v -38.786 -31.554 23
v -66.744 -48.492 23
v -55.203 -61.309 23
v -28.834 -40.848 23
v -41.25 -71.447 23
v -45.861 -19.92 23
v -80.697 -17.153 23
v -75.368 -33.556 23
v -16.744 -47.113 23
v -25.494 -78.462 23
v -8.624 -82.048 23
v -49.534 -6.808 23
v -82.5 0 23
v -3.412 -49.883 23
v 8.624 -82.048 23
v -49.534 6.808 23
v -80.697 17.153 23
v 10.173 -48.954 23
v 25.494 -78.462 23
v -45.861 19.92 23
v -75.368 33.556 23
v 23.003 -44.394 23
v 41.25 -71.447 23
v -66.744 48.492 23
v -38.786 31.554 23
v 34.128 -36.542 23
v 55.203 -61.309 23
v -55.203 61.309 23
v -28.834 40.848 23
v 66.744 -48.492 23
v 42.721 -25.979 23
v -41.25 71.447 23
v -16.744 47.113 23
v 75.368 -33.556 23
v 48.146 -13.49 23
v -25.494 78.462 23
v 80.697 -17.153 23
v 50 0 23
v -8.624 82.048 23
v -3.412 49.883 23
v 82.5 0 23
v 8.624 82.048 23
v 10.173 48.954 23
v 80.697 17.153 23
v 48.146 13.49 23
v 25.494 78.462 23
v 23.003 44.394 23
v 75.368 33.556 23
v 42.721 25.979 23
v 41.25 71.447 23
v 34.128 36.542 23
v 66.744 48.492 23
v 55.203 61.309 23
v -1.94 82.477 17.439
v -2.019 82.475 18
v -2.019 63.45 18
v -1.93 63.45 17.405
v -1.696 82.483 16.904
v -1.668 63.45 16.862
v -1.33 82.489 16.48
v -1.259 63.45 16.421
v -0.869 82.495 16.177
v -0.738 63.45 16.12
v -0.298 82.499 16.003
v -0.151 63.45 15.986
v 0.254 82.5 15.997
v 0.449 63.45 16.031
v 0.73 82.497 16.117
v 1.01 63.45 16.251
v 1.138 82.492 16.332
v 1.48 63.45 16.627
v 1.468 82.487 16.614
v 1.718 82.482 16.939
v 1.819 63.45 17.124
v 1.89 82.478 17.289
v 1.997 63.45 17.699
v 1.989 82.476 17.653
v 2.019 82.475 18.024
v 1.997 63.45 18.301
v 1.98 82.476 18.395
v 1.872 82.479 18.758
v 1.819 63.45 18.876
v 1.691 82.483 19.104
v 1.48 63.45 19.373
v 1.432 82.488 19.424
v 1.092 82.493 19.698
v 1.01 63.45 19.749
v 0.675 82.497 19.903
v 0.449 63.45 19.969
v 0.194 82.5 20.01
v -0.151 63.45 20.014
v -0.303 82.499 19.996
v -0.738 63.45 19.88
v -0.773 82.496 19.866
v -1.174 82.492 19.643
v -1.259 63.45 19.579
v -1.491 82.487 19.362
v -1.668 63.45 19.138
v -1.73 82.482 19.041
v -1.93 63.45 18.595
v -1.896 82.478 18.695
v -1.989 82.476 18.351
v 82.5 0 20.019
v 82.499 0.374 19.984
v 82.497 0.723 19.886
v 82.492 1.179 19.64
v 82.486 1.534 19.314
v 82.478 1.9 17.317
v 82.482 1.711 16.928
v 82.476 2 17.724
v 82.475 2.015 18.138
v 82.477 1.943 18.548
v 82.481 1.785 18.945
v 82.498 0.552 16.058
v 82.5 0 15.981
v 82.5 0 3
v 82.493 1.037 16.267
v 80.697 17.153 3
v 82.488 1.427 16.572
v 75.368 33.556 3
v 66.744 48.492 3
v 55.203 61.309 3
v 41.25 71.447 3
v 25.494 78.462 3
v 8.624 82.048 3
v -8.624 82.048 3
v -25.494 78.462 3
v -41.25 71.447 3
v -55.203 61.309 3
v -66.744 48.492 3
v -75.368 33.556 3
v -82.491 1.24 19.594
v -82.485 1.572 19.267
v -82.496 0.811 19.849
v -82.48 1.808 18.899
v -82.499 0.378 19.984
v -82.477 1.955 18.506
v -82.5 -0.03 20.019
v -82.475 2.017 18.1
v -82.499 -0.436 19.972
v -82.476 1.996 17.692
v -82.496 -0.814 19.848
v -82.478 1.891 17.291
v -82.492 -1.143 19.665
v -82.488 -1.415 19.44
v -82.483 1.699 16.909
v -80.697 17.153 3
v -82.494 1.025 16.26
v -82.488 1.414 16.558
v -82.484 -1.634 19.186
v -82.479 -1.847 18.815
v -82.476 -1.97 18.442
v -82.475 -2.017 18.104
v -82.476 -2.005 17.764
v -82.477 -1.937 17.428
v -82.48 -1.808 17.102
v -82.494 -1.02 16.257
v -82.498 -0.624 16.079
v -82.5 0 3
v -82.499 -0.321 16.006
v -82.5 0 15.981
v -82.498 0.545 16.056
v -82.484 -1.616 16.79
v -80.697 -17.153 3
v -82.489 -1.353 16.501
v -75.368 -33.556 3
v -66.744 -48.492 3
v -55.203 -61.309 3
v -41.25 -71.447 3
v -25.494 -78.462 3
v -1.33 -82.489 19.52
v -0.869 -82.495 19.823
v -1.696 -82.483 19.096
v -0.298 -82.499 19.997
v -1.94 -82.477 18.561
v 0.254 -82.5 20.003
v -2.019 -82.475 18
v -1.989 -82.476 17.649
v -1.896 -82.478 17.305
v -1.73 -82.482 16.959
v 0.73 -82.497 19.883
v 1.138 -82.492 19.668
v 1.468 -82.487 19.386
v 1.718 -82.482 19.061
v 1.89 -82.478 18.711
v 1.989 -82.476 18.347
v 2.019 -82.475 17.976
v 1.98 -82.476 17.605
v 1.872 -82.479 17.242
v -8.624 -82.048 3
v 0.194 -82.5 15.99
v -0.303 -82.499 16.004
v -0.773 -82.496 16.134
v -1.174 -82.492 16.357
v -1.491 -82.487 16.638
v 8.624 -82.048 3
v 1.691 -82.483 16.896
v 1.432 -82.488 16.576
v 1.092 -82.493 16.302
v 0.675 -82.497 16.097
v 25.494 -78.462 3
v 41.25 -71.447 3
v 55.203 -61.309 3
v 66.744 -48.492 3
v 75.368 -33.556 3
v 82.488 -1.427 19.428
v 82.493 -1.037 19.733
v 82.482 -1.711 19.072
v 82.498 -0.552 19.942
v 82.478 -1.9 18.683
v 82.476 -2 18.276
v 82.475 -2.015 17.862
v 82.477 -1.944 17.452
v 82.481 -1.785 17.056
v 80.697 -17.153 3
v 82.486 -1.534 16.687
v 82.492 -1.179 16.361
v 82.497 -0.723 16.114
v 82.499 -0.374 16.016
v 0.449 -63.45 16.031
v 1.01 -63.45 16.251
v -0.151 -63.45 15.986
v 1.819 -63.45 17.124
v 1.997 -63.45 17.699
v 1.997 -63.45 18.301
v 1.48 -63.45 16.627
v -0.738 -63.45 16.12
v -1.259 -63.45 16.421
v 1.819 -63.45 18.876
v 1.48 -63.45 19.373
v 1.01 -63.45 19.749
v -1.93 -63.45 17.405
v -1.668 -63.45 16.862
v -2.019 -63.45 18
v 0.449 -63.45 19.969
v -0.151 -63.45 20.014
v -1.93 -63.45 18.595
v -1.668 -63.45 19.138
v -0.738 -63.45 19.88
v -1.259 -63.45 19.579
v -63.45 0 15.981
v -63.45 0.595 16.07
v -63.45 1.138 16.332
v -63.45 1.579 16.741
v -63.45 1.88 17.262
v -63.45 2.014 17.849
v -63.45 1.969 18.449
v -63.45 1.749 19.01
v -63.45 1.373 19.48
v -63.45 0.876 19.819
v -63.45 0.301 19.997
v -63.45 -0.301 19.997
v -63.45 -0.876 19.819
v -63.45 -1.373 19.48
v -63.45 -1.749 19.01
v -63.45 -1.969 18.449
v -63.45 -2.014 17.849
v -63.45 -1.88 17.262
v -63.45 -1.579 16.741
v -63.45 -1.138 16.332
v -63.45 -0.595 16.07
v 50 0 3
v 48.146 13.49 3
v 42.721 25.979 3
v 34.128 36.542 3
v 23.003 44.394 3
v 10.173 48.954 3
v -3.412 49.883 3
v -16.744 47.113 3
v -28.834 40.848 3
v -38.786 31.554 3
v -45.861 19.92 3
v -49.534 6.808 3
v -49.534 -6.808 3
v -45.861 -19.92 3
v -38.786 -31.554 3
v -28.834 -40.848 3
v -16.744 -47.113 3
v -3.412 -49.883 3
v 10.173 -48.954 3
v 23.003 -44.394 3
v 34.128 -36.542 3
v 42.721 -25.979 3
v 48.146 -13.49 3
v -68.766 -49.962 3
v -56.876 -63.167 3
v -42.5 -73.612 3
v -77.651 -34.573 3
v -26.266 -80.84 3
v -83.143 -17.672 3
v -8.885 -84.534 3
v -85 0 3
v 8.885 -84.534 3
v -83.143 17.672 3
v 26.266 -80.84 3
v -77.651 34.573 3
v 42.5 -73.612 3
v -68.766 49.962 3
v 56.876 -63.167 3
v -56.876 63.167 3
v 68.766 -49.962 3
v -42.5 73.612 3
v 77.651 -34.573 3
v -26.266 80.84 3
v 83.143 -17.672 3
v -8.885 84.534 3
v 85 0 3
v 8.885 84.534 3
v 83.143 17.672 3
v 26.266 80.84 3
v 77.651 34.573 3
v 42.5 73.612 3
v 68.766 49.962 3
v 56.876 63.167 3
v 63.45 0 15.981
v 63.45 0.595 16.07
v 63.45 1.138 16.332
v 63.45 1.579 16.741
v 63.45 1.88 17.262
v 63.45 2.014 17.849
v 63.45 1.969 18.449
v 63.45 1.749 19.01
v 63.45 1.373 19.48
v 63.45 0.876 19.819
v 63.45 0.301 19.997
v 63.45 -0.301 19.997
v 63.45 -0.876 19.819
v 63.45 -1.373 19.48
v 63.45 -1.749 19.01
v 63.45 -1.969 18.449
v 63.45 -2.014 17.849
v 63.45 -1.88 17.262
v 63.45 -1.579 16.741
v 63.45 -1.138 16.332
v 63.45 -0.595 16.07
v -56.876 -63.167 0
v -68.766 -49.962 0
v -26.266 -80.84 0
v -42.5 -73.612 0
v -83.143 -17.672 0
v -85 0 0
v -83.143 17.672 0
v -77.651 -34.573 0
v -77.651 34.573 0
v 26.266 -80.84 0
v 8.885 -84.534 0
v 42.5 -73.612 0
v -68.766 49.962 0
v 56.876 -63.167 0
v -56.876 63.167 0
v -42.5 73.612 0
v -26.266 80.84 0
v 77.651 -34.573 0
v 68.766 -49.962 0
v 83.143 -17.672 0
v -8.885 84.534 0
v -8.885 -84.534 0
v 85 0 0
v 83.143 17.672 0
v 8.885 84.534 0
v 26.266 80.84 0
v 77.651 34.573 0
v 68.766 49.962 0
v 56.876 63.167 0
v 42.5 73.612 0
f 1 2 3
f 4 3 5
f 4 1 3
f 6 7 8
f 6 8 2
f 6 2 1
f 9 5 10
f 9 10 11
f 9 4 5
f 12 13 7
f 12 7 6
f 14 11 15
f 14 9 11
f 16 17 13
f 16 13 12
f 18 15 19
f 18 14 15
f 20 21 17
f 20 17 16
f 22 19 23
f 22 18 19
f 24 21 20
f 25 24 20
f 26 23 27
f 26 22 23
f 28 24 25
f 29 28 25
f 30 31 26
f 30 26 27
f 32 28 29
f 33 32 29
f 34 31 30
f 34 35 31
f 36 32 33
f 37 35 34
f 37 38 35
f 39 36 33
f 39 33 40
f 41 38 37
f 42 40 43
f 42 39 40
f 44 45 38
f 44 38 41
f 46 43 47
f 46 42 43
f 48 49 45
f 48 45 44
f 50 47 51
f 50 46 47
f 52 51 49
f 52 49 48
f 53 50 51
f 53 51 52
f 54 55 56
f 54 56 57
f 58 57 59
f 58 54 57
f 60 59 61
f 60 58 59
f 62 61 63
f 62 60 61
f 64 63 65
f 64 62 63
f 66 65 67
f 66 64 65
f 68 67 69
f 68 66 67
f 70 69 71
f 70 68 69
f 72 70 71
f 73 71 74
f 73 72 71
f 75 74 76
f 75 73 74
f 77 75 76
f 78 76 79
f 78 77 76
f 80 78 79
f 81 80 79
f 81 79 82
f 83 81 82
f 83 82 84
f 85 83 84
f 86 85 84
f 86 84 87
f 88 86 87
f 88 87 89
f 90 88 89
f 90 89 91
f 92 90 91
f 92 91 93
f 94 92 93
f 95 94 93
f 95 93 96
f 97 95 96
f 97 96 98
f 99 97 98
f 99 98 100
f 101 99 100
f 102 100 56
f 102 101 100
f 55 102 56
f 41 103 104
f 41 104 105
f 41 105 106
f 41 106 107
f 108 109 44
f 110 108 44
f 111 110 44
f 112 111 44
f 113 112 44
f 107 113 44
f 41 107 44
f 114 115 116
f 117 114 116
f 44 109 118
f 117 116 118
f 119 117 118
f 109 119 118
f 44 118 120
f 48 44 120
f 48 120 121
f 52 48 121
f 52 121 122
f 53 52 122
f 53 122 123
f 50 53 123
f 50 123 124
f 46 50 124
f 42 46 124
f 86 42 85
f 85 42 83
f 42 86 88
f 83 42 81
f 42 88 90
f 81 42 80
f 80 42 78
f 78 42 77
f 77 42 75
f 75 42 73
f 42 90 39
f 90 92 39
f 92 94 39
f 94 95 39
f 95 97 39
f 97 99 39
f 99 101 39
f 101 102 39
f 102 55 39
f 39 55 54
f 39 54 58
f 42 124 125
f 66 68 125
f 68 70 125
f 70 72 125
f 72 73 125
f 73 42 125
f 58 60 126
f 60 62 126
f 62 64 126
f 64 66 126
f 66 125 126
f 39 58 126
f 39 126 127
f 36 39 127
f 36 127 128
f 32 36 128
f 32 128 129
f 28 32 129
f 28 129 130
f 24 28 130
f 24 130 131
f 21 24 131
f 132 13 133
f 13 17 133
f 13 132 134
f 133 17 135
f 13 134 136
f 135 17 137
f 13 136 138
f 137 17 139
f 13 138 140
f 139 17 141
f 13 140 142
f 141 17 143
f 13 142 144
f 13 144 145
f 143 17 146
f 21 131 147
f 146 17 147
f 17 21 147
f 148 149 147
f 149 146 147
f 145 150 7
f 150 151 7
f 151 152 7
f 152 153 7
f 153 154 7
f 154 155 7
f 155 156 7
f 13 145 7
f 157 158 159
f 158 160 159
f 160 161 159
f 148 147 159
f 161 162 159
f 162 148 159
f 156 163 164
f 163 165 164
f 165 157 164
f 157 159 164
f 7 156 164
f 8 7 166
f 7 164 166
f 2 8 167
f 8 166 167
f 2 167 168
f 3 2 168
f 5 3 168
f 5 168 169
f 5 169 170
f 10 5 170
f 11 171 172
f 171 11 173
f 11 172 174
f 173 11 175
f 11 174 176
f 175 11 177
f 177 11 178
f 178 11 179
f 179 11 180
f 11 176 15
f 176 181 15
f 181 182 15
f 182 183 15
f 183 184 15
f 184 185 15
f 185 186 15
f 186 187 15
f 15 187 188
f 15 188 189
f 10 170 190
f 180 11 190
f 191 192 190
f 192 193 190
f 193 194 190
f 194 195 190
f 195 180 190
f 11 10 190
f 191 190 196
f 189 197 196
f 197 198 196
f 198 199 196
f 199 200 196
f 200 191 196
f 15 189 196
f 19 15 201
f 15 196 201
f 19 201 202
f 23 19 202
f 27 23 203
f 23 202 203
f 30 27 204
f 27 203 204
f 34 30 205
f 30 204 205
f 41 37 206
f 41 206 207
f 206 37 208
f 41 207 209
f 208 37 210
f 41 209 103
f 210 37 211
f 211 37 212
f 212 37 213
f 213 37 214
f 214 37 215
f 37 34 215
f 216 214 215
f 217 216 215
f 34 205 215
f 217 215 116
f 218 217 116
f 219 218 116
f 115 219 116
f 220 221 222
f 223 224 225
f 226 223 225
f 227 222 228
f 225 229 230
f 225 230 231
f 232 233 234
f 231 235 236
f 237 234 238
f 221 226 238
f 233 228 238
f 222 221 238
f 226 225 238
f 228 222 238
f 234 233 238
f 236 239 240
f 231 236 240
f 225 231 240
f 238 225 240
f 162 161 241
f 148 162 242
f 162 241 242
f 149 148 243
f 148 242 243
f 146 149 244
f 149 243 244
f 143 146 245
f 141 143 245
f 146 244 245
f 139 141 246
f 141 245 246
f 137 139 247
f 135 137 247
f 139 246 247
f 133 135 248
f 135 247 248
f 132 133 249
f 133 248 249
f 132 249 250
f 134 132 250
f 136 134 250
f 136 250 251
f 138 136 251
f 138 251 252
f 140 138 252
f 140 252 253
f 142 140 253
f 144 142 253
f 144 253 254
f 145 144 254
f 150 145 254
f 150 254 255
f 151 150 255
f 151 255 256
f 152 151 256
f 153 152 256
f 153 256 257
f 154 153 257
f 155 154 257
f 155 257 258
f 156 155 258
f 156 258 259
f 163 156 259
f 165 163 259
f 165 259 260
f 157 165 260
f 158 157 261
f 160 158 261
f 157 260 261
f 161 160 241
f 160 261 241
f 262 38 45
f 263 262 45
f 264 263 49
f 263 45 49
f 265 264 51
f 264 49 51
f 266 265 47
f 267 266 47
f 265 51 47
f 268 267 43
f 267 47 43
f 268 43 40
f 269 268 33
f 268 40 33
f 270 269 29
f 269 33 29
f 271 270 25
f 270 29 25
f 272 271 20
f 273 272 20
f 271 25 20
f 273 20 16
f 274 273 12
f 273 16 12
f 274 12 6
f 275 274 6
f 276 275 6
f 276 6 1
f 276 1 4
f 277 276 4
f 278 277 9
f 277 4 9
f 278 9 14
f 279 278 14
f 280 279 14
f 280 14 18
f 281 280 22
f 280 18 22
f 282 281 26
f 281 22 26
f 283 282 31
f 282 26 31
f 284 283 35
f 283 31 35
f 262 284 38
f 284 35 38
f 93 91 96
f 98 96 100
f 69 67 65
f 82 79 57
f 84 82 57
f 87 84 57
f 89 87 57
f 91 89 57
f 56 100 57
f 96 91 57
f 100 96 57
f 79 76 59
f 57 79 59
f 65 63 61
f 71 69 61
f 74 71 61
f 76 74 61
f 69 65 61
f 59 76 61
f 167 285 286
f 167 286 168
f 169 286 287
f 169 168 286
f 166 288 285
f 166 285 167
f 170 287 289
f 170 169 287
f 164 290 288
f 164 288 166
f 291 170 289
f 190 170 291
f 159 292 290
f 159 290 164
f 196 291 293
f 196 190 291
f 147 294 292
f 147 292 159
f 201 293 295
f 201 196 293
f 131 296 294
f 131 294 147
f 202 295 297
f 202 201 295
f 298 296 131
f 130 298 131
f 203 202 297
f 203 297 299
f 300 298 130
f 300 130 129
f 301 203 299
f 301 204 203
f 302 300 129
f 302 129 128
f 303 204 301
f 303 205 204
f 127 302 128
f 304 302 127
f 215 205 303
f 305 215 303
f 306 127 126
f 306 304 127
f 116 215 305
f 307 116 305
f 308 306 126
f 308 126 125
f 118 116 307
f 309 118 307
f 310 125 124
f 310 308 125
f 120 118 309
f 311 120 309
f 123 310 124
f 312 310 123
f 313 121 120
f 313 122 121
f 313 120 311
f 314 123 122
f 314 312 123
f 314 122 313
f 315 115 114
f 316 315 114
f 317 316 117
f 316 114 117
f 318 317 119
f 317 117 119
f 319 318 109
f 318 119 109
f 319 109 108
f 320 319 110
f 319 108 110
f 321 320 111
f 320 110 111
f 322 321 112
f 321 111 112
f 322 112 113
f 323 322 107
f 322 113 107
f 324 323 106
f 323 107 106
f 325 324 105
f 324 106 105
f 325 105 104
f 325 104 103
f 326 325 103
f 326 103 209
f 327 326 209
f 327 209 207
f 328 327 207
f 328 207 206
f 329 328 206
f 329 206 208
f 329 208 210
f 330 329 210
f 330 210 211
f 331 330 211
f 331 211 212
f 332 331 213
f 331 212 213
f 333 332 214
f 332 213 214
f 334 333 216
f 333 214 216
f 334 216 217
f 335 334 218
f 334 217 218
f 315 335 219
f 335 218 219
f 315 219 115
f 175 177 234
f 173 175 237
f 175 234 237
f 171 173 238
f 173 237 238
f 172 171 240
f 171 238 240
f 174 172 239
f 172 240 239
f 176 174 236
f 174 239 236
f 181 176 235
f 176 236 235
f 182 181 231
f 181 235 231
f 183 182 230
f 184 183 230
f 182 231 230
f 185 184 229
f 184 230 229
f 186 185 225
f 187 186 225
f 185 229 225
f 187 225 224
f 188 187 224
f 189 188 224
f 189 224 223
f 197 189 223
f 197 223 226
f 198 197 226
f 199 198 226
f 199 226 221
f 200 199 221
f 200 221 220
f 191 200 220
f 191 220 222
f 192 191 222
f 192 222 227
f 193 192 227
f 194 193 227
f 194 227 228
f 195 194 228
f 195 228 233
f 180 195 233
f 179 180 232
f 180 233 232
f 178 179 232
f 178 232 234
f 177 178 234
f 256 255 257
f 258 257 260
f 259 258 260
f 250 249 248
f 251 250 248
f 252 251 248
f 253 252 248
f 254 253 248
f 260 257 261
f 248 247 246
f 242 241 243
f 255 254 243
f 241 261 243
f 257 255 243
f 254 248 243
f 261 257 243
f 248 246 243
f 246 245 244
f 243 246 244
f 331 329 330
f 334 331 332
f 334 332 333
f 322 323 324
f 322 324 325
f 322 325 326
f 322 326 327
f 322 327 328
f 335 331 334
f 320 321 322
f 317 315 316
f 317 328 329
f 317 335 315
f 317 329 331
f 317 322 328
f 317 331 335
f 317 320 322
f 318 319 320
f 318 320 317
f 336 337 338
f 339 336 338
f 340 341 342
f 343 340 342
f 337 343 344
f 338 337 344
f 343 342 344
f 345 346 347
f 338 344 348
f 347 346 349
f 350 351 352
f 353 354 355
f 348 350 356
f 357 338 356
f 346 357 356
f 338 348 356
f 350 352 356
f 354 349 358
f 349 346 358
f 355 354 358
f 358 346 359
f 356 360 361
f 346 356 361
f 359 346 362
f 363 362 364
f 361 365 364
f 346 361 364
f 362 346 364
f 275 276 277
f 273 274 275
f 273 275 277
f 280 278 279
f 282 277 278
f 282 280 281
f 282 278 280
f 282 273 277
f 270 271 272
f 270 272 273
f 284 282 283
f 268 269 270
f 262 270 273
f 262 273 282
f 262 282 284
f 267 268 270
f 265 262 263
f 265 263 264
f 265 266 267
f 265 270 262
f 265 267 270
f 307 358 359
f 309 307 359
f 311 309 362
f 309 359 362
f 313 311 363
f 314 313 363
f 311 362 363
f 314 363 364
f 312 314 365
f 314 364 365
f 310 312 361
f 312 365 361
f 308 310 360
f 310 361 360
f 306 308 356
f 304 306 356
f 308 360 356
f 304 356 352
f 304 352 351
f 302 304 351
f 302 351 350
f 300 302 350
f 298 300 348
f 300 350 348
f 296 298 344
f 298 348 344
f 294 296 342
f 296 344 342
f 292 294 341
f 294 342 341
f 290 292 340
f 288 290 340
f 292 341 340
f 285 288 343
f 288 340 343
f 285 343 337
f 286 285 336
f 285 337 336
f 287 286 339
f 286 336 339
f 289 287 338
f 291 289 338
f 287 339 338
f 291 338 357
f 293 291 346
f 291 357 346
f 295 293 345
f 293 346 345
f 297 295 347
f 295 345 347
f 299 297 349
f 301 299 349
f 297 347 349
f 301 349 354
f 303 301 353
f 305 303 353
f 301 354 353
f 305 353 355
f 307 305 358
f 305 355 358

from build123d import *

# Parameters (mm, degrees)
SKETCH1_R           = 85
BOSS_EXTRUDE2_DEPTH = 3
SKETCH2_R           = 82.5
BOSS_EXTRUDE3_DEPTH = 20
SKETCH3_R           = 50
CUT_EXTRUDE1_DEPTH  = 20
SKETCH9_R           = 2.0193
CUT_EXTRUDE5_DEPTH  = 19.05
CUT_EXTRUDE6_START  = 19.05
SKETCH10_R          = 2.0193
CUT_EXTRUDE6_DEPTH  = 19.05
SKETCH11_R          = 2.0193
CUT_EXTRUDE7_DEPTH  = 19.05
CUT_EXTRUDE8_START  = 19.05
SKETCH12_R          = 2.0193
CUT_EXTRUDE8_DEPTH  = 19.05


with BuildPart() as part:
    # Sketch1 → Boss-Extrude2 (new body)
    with BuildSketch(Plane.XY):
        Circle(SKETCH1_R)
    extrude(amount=BOSS_EXTRUDE2_DEPTH)

    # Sketch2 → Boss-Extrude3 (add)
    with BuildSketch(Plane.XY.offset(3)):
        Circle(SKETCH2_R)
    extrude(amount=BOSS_EXTRUDE3_DEPTH)

    # Sketch3 → Cut-Extrude1 (cut)
    with BuildSketch(Plane.XY.offset(23)):
        Circle(SKETCH3_R)
    extrude(amount=-CUT_EXTRUDE1_DEPTH, mode=Mode.SUBTRACT)

    # Sketch9 → Cut-Extrude5 (cut)
    with BuildSketch(Plane(origin=(0, 82.5, 0), x_dir=(-1, 0, 0), z_dir=(0, -1, 0))):
        with Locations((0, -18)):
            Circle(SKETCH9_R)
    extrude(amount=CUT_EXTRUDE5_DEPTH, mode=Mode.SUBTRACT)

    # Sketch10 → Cut-Extrude6 (cut)
    with BuildSketch(Plane(origin=(0, -82.5, 0), x_dir=(1, 0, 0), z_dir=(0, 1, 0)).offset(CUT_EXTRUDE6_START)):
        with Locations(Location((0, -18, 0), (0, 0, 180))):
            Circle(SKETCH10_R)
    extrude(amount=-CUT_EXTRUDE6_DEPTH, mode=Mode.SUBTRACT)

    # Sketch11 → Cut-Extrude7 (cut)
    with BuildSketch(Plane(origin=(82.5, 0, 0), x_dir=(0, 0, -1), z_dir=(1, 0, 0))):
        with Locations((-18, 0)):
            Circle(SKETCH11_R)
    extrude(amount=-CUT_EXTRUDE7_DEPTH, mode=Mode.SUBTRACT)

    # Sketch12 → Cut-Extrude8 (cut)
    with BuildSketch(Plane(origin=(-82.5, 0, 0), x_dir=(0, 0, -1), z_dir=(1, 0, 0)).offset(CUT_EXTRUDE8_START)):
        with Locations((-18, 0)):
            Circle(SKETCH12_R)
    extrude(amount=-CUT_EXTRUDE8_DEPTH, mode=Mode.SUBTRACT)


solid = part.part
